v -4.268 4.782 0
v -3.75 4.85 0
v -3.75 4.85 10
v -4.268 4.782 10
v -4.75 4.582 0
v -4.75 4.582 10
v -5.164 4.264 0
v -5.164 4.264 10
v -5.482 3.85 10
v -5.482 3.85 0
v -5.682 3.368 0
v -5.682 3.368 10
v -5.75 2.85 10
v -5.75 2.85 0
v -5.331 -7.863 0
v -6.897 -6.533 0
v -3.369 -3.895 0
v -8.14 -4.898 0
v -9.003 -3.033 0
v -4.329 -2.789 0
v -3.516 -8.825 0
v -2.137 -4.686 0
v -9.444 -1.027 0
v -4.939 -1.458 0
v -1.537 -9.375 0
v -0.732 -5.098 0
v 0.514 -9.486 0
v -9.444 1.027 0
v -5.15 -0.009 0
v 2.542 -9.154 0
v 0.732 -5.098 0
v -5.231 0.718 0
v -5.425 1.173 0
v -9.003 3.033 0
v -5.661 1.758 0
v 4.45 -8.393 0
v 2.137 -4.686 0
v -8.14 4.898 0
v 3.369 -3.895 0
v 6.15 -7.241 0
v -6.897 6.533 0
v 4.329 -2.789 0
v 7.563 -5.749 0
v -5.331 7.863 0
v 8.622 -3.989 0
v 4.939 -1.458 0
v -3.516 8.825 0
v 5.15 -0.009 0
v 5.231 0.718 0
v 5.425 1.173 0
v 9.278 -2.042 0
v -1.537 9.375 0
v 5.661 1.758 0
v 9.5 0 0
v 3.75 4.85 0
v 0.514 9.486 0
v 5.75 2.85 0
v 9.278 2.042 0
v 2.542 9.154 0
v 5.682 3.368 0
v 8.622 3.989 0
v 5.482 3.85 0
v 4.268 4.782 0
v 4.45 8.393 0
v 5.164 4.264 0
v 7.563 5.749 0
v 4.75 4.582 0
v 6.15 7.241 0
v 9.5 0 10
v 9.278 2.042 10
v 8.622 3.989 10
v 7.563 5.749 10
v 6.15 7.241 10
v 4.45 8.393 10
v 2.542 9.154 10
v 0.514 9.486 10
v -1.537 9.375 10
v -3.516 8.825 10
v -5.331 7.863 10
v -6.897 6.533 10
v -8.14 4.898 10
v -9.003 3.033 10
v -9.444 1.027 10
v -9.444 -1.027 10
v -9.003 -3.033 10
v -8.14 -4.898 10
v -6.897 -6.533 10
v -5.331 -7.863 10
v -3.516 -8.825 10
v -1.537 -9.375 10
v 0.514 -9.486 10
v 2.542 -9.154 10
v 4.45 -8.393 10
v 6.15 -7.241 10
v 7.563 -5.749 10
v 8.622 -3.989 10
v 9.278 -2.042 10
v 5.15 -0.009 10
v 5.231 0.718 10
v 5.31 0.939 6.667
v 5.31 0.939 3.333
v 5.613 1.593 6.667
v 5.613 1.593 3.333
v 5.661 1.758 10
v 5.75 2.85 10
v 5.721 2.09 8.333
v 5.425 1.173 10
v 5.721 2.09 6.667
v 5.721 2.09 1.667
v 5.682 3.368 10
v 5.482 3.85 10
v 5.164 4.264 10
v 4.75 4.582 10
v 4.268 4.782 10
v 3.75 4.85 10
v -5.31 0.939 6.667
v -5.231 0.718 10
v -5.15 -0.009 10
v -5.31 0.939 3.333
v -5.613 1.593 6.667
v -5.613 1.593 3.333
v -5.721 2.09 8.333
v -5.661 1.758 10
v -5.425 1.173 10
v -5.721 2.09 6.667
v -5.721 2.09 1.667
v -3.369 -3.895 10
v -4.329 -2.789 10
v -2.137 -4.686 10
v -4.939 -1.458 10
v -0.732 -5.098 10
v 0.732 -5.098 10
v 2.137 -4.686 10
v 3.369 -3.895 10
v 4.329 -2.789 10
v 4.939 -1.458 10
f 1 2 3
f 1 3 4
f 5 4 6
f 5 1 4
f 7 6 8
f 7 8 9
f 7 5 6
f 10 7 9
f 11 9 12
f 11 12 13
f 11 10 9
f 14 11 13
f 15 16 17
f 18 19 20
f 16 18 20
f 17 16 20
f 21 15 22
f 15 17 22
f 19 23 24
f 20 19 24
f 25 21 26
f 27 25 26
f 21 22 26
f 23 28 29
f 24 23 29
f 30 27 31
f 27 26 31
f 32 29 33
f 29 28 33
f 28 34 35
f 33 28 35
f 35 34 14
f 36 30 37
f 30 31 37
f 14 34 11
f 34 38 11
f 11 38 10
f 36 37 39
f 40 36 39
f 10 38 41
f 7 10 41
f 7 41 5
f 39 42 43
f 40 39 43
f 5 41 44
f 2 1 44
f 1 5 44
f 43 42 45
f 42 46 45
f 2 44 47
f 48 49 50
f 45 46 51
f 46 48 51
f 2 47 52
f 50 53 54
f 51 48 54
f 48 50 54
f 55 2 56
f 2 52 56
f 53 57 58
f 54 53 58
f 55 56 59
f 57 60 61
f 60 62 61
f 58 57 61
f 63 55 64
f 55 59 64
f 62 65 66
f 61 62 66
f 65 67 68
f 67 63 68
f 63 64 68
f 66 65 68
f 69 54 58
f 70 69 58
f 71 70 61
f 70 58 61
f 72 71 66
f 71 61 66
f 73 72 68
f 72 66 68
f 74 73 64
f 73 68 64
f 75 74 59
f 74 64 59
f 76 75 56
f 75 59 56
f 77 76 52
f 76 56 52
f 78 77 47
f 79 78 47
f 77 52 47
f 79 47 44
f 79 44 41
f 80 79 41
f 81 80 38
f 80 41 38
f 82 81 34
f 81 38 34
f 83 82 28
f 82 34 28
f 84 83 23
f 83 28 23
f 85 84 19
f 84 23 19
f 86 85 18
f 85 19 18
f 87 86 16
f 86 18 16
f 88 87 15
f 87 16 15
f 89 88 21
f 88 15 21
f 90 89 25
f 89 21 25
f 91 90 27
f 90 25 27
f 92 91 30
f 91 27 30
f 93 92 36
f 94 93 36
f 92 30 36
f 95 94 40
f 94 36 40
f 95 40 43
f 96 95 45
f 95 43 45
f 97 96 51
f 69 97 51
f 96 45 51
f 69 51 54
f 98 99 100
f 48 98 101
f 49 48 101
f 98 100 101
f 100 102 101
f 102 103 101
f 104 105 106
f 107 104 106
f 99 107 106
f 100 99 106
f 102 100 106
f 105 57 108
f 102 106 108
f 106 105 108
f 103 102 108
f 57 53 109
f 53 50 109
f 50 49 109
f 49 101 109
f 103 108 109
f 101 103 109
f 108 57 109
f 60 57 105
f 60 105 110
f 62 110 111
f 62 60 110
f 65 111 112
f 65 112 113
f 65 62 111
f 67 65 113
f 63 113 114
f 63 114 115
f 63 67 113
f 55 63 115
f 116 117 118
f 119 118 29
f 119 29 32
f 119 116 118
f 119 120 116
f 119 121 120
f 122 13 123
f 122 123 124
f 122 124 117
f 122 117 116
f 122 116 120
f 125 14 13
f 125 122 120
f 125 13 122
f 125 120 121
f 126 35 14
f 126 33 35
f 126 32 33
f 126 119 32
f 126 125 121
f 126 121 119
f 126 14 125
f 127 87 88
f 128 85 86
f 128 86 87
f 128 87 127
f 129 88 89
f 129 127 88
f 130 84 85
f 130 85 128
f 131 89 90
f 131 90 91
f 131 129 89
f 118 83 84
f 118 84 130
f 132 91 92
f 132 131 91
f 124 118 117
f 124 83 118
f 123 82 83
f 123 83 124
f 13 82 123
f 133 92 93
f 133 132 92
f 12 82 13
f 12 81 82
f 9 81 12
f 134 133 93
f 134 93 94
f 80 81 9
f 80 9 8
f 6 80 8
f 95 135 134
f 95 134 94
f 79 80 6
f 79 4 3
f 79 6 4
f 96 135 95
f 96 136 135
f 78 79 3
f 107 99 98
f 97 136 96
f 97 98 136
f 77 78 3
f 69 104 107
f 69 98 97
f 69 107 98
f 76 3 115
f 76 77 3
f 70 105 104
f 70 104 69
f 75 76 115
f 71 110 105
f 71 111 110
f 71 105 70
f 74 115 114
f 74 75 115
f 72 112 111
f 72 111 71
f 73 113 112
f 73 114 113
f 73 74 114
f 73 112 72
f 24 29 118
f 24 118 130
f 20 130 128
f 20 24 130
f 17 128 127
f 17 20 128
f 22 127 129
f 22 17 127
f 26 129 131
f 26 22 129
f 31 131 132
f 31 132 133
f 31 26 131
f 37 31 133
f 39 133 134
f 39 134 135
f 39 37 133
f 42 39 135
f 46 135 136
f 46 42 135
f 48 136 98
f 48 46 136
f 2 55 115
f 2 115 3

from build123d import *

# Parameters (mm, degrees)
SKETCH_R  = 9.5
PAD_DEPTH = 10


with BuildPart() as part:
    # Sketch → Pad (new body)
    with BuildSketch(Plane.XY):
        Circle(SKETCH_R)
        with BuildLine():
            ThreePointArc((-3.75, 4.85), (-5.164214, 4.264214), (-5.75, 2.85))
            add(Edge.make_bspline(
                [(-5.75, 2.85), (-5.797957, 0.992558), (-5.136857, 1.384321), (-5.149992, -0.009195)],
                knots=[0, 0, 0, 0, 1, 1, 1, 1], degree=3))
            ThreePointArc((-5.149992, -0.009195), (0, -5.15), (5.149992, -0.009195))
            add(Edge.make_bspline(
                [(5.75, 2.85), (5.797957, 0.992558), (5.136857, 1.384321), (5.149992, -0.009195)],
                knots=[0, 0, 0, 0, 1, 1, 1, 1], degree=3))
            ThreePointArc((5.75, 2.85), (5.164214, 4.264214), (3.75, 4.85))
            Line((3.75, 4.85), (-3.75, 4.85))
        make_face(mode=Mode.SUBTRACT)
    extrude(amount=PAD_DEPTH)


solid = part.part
